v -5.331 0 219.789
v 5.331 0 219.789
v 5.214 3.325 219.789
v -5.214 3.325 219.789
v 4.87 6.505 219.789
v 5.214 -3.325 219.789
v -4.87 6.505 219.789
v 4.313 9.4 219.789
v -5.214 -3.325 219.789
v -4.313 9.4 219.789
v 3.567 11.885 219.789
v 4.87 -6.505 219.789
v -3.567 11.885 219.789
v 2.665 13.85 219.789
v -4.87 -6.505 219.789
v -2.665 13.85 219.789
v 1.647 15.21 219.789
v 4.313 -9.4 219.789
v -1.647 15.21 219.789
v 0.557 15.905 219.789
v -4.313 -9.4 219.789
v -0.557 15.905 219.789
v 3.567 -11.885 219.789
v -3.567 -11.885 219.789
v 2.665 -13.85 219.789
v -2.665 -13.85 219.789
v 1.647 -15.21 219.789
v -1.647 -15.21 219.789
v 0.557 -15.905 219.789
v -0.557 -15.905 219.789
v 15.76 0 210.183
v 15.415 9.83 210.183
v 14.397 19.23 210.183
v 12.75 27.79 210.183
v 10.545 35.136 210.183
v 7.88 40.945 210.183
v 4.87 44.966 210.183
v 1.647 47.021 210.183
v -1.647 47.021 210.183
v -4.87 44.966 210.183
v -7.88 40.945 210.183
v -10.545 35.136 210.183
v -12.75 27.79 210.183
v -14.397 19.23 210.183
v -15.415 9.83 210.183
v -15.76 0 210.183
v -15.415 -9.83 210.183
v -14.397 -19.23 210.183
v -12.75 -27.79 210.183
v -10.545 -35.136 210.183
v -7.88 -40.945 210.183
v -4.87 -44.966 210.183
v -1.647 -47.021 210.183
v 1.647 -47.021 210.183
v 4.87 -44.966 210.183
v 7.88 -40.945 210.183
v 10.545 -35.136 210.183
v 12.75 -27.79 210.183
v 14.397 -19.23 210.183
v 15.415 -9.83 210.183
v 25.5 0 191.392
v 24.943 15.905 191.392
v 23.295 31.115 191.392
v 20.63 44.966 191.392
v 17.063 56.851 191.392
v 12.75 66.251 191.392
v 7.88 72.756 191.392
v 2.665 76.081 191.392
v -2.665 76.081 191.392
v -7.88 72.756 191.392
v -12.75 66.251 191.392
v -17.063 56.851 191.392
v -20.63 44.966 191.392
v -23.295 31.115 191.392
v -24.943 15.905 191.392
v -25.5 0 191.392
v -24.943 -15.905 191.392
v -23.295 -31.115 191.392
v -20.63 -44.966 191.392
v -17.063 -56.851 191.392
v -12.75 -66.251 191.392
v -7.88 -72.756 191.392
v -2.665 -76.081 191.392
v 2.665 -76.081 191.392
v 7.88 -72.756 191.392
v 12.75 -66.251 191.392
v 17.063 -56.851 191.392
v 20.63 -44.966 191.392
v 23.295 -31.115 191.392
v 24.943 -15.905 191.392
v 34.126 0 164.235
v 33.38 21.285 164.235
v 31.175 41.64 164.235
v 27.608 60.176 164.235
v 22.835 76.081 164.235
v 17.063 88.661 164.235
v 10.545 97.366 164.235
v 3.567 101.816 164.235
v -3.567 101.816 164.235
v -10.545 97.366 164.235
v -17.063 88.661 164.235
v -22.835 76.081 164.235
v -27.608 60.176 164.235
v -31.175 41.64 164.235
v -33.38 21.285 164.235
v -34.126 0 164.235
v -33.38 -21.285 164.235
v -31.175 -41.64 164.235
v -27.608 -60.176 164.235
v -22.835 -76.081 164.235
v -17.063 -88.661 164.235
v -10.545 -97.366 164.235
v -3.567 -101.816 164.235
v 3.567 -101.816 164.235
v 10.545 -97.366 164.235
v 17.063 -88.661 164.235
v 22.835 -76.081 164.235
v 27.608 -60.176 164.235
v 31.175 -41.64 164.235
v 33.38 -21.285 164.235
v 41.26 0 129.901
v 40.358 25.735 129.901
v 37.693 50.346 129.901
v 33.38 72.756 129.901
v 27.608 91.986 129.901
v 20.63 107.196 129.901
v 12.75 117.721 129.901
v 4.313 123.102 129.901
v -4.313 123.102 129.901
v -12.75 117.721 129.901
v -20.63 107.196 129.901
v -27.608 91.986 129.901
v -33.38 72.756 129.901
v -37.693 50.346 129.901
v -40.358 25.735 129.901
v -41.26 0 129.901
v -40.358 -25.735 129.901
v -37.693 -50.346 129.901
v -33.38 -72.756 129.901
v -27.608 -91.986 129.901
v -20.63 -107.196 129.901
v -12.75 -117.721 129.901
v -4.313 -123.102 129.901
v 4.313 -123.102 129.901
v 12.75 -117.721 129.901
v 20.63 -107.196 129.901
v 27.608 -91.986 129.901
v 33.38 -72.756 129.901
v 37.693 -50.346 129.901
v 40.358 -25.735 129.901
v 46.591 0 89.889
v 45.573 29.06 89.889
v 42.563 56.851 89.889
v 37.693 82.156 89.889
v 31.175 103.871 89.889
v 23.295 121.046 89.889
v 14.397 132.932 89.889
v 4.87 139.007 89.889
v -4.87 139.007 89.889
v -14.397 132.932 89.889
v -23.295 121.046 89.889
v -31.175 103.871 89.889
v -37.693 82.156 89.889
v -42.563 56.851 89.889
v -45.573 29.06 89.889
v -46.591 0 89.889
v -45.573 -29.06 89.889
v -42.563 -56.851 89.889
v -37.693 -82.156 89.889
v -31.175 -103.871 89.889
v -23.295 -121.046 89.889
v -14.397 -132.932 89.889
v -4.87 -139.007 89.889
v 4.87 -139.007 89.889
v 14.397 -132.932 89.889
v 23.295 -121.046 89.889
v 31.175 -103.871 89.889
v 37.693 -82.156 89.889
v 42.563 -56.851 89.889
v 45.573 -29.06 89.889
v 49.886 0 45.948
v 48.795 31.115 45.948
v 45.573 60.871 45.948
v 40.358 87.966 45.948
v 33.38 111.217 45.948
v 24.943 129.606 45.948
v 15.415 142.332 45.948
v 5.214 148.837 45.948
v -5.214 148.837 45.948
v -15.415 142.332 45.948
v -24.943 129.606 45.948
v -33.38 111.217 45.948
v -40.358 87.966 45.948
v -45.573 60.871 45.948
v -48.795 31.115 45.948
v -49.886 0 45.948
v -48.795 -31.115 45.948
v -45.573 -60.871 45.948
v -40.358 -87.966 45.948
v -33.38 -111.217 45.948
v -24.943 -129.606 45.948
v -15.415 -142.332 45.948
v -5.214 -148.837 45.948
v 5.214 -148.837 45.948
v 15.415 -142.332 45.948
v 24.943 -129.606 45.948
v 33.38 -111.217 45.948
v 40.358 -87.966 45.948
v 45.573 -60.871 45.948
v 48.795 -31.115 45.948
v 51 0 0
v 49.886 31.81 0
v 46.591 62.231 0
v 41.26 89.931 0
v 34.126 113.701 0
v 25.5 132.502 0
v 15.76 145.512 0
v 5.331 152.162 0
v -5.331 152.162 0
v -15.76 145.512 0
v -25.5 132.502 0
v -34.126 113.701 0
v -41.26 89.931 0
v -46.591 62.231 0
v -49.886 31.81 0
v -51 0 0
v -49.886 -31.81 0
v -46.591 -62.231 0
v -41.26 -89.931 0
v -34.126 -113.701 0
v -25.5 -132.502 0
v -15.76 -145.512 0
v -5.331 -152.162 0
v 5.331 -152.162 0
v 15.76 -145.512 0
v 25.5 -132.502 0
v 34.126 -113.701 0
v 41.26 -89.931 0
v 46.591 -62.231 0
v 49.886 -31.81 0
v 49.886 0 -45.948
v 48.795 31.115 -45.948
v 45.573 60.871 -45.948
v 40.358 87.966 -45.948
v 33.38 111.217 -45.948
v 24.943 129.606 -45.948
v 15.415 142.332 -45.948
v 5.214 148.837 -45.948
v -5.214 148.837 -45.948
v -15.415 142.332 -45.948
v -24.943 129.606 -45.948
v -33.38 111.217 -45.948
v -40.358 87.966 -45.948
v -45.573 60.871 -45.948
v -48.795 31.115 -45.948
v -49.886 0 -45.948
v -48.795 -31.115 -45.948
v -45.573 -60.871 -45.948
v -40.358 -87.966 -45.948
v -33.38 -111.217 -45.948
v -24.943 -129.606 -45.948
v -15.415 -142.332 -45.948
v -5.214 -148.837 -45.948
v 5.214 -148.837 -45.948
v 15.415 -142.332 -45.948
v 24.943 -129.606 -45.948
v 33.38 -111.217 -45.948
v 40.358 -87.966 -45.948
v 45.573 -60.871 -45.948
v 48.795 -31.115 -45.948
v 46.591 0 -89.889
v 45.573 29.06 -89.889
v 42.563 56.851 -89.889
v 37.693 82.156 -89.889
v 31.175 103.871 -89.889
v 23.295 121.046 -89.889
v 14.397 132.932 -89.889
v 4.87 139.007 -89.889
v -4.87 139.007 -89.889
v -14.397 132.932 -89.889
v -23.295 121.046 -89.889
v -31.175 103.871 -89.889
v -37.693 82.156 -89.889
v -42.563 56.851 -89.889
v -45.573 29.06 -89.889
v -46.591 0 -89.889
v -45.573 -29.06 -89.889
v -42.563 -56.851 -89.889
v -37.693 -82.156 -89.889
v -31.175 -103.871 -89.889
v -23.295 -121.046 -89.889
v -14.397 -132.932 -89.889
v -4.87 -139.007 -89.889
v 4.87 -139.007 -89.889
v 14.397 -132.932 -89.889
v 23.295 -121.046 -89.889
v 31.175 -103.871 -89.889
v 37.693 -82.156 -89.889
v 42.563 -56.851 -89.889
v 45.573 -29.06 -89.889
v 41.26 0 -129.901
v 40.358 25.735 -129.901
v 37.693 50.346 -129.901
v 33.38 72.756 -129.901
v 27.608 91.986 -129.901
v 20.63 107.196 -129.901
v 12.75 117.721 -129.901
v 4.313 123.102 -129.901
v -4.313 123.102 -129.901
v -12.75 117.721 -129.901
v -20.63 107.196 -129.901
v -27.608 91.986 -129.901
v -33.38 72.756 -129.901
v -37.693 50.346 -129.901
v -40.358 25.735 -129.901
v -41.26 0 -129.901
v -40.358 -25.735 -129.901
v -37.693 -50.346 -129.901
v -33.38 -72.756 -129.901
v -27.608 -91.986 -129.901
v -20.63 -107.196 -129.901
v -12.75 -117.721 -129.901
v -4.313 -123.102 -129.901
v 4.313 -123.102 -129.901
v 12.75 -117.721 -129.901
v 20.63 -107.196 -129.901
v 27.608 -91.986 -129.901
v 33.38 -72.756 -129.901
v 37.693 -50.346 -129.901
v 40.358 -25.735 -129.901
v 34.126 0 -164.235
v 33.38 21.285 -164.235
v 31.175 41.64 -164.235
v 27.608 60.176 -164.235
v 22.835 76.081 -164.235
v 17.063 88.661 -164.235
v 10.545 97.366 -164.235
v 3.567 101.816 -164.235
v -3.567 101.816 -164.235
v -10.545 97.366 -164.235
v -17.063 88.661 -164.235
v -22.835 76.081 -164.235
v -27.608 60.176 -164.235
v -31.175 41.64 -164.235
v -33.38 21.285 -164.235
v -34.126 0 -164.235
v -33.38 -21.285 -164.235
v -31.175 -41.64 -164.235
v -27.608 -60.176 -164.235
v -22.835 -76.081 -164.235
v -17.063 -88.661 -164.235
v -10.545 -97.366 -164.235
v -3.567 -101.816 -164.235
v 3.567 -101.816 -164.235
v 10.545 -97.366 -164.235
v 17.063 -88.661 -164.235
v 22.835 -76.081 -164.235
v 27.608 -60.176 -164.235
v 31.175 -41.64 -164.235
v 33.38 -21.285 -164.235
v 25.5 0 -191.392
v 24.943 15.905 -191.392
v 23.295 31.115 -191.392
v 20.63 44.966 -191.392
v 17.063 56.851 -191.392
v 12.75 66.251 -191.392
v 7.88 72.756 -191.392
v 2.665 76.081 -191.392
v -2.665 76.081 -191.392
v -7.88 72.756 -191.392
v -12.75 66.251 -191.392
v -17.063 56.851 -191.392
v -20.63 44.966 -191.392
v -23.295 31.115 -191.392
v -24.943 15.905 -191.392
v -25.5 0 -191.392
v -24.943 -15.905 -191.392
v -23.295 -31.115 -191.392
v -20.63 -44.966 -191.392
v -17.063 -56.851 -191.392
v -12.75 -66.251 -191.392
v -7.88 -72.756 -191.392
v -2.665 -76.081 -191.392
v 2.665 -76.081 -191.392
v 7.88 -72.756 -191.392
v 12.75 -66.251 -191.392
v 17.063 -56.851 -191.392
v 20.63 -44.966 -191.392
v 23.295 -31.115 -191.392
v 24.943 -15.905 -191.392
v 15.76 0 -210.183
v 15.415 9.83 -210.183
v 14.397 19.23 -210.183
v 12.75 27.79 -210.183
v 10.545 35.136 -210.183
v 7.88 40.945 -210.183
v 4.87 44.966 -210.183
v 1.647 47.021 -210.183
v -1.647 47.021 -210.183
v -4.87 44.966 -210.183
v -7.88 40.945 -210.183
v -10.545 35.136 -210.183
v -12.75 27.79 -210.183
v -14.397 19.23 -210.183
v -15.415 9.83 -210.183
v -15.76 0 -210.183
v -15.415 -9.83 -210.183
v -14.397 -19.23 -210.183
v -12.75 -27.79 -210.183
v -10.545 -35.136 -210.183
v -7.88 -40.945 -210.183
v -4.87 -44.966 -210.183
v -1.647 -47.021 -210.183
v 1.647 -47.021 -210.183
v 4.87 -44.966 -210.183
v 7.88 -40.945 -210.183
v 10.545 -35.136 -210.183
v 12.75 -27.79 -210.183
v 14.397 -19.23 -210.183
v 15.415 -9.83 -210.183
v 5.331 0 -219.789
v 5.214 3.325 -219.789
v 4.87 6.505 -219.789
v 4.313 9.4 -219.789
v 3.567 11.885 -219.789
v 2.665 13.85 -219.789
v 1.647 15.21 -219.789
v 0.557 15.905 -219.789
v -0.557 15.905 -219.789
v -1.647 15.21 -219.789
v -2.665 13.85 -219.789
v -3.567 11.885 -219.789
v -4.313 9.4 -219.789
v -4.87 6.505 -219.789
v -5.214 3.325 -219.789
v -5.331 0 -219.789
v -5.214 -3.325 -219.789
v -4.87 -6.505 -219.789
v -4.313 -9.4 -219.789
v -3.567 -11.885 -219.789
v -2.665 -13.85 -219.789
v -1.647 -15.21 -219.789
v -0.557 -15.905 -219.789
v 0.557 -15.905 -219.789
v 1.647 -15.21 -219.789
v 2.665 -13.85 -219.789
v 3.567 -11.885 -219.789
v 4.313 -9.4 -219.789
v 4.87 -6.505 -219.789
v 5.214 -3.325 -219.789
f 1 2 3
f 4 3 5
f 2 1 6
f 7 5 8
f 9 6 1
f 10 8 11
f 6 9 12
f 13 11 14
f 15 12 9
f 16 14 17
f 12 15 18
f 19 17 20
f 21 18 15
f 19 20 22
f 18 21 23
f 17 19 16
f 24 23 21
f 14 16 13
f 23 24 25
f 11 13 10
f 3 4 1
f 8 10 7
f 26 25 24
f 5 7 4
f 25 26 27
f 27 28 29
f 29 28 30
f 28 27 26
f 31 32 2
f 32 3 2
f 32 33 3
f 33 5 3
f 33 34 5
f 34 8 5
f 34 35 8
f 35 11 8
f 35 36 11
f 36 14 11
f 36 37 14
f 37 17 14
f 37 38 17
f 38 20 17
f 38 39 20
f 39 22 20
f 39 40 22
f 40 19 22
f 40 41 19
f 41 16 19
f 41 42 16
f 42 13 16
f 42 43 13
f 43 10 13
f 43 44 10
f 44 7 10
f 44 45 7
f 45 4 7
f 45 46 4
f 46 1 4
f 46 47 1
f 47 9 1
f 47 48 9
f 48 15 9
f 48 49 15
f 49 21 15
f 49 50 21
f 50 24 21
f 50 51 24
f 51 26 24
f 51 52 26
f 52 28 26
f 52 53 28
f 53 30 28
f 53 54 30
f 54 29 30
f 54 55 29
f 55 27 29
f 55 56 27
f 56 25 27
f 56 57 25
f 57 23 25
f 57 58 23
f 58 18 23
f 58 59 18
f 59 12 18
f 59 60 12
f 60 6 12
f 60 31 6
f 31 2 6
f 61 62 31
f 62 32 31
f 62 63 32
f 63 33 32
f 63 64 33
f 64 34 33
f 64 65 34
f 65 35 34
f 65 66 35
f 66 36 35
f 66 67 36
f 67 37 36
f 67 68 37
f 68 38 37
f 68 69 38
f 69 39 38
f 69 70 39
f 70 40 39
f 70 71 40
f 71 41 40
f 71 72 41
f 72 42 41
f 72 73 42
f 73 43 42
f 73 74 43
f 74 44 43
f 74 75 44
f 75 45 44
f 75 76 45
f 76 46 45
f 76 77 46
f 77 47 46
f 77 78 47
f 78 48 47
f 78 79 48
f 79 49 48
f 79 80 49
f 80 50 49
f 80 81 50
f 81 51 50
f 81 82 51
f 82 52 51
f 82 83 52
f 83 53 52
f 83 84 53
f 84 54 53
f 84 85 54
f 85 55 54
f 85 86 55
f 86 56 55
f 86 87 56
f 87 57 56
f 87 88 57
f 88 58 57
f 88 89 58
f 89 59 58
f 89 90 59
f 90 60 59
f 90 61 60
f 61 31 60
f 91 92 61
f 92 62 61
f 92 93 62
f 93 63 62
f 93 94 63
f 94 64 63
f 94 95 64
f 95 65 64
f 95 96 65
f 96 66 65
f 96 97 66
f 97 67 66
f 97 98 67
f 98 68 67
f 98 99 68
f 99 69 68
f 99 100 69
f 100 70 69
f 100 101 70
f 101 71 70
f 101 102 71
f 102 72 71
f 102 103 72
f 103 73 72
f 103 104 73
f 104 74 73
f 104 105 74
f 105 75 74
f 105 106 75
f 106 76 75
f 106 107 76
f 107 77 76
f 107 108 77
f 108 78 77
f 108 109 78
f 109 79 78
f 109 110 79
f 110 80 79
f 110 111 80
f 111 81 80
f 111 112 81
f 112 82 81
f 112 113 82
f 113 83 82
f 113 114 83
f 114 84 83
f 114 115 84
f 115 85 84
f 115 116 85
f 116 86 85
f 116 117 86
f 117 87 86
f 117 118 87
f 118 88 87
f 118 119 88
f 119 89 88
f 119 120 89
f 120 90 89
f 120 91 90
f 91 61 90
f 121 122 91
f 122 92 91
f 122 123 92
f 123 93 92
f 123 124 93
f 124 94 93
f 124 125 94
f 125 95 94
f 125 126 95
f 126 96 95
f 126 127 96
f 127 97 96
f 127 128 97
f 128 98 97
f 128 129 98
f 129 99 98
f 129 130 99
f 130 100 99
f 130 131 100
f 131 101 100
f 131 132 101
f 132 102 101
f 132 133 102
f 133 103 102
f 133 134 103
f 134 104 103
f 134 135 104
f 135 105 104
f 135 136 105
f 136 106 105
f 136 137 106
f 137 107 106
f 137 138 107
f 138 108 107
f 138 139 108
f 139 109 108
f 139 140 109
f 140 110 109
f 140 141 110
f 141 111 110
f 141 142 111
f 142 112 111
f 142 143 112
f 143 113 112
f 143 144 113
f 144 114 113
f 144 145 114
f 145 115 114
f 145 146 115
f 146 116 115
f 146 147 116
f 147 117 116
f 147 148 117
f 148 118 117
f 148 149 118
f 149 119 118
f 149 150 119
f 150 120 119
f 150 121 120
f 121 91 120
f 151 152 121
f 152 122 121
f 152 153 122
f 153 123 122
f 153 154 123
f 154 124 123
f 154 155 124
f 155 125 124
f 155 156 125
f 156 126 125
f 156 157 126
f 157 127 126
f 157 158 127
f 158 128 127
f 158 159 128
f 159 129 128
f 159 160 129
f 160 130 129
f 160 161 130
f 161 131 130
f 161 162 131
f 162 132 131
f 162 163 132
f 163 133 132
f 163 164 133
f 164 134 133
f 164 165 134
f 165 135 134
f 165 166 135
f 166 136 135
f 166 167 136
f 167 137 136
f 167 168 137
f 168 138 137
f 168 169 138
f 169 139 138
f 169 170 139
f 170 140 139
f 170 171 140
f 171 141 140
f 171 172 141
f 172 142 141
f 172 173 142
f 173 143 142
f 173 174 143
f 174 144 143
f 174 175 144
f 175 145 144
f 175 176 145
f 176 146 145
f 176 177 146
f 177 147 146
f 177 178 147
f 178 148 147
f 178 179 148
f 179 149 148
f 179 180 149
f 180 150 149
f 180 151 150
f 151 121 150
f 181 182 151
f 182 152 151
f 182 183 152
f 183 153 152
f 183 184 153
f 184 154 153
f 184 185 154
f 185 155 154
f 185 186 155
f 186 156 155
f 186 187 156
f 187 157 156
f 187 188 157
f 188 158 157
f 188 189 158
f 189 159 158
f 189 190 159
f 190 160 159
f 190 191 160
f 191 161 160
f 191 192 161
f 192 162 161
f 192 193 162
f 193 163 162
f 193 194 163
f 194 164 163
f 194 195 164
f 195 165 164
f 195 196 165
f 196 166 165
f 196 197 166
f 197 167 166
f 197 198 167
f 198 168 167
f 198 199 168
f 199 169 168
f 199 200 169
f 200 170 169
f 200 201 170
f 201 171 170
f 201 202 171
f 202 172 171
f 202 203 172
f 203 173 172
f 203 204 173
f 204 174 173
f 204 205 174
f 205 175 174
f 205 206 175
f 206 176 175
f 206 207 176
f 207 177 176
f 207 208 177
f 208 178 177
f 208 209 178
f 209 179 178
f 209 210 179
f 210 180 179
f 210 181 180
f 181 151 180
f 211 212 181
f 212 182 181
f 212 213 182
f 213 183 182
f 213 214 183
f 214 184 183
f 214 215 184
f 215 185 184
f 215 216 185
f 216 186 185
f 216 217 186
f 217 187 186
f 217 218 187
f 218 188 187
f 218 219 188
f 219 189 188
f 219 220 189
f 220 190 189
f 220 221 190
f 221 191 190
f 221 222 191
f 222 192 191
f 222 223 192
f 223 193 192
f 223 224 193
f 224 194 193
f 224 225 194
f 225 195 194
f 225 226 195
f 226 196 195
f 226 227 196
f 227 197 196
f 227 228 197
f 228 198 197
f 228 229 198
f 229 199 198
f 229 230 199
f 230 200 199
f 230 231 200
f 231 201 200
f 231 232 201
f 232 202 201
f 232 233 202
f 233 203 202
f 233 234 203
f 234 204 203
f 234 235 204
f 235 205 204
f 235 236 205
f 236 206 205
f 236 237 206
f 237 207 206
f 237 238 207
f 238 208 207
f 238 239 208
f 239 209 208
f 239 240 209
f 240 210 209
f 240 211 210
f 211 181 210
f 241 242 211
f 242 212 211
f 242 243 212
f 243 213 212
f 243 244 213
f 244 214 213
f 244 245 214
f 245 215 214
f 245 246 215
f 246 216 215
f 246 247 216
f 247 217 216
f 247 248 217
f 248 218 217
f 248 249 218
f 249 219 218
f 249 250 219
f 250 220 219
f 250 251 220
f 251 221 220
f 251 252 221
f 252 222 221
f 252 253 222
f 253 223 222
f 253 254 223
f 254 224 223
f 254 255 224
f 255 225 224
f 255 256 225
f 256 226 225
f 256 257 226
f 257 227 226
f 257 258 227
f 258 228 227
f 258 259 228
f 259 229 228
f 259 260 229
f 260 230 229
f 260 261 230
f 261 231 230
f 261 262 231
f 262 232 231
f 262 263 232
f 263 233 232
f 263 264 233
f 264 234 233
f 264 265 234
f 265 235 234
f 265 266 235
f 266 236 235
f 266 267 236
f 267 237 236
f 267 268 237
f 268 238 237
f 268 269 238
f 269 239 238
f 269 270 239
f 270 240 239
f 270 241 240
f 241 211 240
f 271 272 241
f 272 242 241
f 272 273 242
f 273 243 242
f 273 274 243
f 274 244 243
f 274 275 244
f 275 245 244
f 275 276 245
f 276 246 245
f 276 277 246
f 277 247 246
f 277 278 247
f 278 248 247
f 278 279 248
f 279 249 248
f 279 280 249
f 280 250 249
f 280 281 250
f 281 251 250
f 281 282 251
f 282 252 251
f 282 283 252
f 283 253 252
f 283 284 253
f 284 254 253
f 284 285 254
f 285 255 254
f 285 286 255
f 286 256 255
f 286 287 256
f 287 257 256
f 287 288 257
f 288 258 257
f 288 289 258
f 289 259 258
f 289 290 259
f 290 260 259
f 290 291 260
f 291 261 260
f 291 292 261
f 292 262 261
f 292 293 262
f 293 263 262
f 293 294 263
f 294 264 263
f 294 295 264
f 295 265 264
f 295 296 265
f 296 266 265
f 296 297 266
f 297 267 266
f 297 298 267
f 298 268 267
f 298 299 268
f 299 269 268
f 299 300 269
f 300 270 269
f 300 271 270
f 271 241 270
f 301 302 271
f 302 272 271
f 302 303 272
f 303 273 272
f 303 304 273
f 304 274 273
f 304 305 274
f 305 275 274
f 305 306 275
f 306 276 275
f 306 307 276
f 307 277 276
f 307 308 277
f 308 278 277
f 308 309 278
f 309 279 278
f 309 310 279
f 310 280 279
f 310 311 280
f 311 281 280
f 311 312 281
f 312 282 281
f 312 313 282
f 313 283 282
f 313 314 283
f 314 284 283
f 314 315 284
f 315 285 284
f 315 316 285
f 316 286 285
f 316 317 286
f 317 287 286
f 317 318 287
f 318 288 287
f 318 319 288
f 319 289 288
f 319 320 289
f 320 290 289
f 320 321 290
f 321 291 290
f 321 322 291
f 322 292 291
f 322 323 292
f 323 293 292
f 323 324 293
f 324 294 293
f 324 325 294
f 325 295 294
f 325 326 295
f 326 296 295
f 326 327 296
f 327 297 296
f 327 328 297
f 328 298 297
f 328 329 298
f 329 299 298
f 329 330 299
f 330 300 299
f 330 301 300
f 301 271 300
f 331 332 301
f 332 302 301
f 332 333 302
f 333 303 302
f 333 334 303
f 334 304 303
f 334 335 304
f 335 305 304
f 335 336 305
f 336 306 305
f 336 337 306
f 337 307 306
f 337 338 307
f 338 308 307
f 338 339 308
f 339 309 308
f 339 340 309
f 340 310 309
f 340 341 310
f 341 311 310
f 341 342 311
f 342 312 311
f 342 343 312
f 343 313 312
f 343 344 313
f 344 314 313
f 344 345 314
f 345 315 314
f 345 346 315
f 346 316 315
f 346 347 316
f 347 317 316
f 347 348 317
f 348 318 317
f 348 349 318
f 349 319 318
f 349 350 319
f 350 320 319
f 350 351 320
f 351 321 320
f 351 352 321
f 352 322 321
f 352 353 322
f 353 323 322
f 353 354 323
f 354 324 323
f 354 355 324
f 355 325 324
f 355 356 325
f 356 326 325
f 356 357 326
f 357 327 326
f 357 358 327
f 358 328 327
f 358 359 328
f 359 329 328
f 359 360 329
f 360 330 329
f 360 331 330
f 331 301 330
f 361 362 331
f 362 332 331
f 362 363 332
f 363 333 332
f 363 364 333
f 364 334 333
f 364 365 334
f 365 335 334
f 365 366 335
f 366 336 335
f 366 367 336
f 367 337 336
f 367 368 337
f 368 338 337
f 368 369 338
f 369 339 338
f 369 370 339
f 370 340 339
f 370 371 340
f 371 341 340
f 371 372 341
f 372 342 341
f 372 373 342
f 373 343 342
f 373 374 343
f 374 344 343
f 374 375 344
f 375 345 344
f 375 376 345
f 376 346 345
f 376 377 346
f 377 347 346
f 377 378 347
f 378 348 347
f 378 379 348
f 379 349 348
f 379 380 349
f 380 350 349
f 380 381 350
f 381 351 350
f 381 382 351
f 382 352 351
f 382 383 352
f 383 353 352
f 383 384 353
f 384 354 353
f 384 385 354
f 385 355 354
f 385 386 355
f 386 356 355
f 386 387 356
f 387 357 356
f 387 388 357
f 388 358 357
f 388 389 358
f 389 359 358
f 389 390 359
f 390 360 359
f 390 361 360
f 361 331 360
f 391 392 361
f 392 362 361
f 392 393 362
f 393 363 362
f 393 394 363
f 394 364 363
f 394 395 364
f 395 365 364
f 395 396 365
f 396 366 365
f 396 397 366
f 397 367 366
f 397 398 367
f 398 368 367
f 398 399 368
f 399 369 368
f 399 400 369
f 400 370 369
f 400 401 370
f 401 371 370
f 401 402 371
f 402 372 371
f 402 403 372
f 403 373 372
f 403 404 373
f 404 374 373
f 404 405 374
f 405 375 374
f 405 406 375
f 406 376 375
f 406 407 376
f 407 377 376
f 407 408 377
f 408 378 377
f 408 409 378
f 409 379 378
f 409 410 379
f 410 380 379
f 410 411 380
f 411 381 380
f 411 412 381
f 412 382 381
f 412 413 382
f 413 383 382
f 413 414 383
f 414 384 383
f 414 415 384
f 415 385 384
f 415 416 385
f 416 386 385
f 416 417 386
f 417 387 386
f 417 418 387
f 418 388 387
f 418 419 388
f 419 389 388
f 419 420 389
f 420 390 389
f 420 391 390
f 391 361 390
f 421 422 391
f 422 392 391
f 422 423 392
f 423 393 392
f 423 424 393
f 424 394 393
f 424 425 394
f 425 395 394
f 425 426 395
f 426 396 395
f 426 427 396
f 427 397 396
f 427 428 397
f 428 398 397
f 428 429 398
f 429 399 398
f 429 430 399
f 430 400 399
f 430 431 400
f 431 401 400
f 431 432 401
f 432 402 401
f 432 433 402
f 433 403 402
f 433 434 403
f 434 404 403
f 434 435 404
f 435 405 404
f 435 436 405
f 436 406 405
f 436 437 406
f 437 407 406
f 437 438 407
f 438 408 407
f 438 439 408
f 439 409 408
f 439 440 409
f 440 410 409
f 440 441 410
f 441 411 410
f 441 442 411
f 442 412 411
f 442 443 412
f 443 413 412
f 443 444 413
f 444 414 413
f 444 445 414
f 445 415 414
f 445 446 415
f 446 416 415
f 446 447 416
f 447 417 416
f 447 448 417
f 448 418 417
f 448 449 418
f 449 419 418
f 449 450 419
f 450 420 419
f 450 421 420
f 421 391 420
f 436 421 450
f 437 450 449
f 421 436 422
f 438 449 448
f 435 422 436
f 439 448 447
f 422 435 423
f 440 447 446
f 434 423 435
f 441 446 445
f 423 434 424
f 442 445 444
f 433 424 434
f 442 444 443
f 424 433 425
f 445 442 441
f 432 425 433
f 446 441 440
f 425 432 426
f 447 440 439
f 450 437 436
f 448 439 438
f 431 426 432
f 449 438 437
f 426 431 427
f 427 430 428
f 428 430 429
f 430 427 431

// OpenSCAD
// Generated by SolidPython 1.0.1 on 2020-07-29 00:46:45


scale(v = [3, 9, 13]) {
	sphere(r = 17);
}
/***********************************************
*********      SolidPython code:      **********
************************************************
 
# import packages: SolidPython
from solid import *
from solid.utils import *
from itertools import chain, combinations, permutations


class Resize:

    def __init__(self, scad_file):
        self.scad_file = scad_file
        #self.scad_file = import_scad(scad_file)
        # cone/cylinder param:
        self.r1 = 0
        self.r2 = 0
        self.h = 0
        # rectangular prism param:
        self.w = 0
        self.l = 0
        # ellipse param:
        self.r = 0

    # import OpenScad code (file name corresponds to shape)


    # classify shape + parameters
    def assign(self, param1, param2, param3):
        if self.scad_file == 'cone.scad':
            self.r1 = param1
            self.r2 = param2
            self.h = param3
        elif self.scad_file == 'cylinder.scad':
            self.r1 = param1
            self.r2 = param2
            self.h = param3
        elif self.scad_file == 'rectangularPrism.scad':
            self.h = param1
            self.l = param2
            self.w = param3
        else:
            self.r = param1
            self.h = param2

    # resize parameters
    def iterate(self):
        x = range(3, 20, 2)
        i = 1
        if self.scad_file == 'cone.scad':
            tempList = list(permutations(x, 2))
            for temp in tempList:
                param1 = temp[0]
                param2 = temp[1]
                filepath = 'produced_scad_files/' + 'cone' + str(param1) + '_' + str(param2) + '_' + '.scad'
                scad_render_to_file(cylinder(h=param1, r1=param2, r2=0), filepath)

        elif self.scad_file == 'cylinder.scad':
            tempList = list(permutations(x, 3))
            for temp in tempList:
                param1 = temp[0]
                param2 = temp[1]
                filepath = 'produced_scad_files/' + 'cylinder' + str(param1) + '_' + str(param2) + '_' + '.scad'
                scad_render_to_file(cylinder(h=param1, r1=param2, r2=param2), filepath)

        elif self.scad_file == 'rectangularPrism.scad':
            tempList = list(permutations(x, 3))
            for temp in tempList:
                param1 = temp[0]
                param2 = temp[1]
                param3 = temp[2]
                filepath = 'produced_scad_files/' + 'rectangularPrism' + str(param1) + '_' + str(param2) + '_' + str(
                    param3) + '.scad'
                scad_render_to_file(cube(size=(param1, param2, param3)), filepath)

        elif self.scad_file == 'ellipse.scad':
            tempList = list(permutations(x, 4))
            for temp in tempList:
                param1 = temp[0]
                param2 = temp[1]
                param3 = temp[2]
                param4 = temp[3]
                filepath = 'produced_scad_files/' + 'ellipse' + str(param1) + '_' + str(param2) + '_' + str(param3) + '_' + str(param4) + '.scad'
                scad_render_to_file(scale([param1, param2, param3])(sphere(r=param4)), filepath)

    def render_to_scadfile(self):
        scad_render_to_file(scad, 'example.scad') 
 
************************************************/
